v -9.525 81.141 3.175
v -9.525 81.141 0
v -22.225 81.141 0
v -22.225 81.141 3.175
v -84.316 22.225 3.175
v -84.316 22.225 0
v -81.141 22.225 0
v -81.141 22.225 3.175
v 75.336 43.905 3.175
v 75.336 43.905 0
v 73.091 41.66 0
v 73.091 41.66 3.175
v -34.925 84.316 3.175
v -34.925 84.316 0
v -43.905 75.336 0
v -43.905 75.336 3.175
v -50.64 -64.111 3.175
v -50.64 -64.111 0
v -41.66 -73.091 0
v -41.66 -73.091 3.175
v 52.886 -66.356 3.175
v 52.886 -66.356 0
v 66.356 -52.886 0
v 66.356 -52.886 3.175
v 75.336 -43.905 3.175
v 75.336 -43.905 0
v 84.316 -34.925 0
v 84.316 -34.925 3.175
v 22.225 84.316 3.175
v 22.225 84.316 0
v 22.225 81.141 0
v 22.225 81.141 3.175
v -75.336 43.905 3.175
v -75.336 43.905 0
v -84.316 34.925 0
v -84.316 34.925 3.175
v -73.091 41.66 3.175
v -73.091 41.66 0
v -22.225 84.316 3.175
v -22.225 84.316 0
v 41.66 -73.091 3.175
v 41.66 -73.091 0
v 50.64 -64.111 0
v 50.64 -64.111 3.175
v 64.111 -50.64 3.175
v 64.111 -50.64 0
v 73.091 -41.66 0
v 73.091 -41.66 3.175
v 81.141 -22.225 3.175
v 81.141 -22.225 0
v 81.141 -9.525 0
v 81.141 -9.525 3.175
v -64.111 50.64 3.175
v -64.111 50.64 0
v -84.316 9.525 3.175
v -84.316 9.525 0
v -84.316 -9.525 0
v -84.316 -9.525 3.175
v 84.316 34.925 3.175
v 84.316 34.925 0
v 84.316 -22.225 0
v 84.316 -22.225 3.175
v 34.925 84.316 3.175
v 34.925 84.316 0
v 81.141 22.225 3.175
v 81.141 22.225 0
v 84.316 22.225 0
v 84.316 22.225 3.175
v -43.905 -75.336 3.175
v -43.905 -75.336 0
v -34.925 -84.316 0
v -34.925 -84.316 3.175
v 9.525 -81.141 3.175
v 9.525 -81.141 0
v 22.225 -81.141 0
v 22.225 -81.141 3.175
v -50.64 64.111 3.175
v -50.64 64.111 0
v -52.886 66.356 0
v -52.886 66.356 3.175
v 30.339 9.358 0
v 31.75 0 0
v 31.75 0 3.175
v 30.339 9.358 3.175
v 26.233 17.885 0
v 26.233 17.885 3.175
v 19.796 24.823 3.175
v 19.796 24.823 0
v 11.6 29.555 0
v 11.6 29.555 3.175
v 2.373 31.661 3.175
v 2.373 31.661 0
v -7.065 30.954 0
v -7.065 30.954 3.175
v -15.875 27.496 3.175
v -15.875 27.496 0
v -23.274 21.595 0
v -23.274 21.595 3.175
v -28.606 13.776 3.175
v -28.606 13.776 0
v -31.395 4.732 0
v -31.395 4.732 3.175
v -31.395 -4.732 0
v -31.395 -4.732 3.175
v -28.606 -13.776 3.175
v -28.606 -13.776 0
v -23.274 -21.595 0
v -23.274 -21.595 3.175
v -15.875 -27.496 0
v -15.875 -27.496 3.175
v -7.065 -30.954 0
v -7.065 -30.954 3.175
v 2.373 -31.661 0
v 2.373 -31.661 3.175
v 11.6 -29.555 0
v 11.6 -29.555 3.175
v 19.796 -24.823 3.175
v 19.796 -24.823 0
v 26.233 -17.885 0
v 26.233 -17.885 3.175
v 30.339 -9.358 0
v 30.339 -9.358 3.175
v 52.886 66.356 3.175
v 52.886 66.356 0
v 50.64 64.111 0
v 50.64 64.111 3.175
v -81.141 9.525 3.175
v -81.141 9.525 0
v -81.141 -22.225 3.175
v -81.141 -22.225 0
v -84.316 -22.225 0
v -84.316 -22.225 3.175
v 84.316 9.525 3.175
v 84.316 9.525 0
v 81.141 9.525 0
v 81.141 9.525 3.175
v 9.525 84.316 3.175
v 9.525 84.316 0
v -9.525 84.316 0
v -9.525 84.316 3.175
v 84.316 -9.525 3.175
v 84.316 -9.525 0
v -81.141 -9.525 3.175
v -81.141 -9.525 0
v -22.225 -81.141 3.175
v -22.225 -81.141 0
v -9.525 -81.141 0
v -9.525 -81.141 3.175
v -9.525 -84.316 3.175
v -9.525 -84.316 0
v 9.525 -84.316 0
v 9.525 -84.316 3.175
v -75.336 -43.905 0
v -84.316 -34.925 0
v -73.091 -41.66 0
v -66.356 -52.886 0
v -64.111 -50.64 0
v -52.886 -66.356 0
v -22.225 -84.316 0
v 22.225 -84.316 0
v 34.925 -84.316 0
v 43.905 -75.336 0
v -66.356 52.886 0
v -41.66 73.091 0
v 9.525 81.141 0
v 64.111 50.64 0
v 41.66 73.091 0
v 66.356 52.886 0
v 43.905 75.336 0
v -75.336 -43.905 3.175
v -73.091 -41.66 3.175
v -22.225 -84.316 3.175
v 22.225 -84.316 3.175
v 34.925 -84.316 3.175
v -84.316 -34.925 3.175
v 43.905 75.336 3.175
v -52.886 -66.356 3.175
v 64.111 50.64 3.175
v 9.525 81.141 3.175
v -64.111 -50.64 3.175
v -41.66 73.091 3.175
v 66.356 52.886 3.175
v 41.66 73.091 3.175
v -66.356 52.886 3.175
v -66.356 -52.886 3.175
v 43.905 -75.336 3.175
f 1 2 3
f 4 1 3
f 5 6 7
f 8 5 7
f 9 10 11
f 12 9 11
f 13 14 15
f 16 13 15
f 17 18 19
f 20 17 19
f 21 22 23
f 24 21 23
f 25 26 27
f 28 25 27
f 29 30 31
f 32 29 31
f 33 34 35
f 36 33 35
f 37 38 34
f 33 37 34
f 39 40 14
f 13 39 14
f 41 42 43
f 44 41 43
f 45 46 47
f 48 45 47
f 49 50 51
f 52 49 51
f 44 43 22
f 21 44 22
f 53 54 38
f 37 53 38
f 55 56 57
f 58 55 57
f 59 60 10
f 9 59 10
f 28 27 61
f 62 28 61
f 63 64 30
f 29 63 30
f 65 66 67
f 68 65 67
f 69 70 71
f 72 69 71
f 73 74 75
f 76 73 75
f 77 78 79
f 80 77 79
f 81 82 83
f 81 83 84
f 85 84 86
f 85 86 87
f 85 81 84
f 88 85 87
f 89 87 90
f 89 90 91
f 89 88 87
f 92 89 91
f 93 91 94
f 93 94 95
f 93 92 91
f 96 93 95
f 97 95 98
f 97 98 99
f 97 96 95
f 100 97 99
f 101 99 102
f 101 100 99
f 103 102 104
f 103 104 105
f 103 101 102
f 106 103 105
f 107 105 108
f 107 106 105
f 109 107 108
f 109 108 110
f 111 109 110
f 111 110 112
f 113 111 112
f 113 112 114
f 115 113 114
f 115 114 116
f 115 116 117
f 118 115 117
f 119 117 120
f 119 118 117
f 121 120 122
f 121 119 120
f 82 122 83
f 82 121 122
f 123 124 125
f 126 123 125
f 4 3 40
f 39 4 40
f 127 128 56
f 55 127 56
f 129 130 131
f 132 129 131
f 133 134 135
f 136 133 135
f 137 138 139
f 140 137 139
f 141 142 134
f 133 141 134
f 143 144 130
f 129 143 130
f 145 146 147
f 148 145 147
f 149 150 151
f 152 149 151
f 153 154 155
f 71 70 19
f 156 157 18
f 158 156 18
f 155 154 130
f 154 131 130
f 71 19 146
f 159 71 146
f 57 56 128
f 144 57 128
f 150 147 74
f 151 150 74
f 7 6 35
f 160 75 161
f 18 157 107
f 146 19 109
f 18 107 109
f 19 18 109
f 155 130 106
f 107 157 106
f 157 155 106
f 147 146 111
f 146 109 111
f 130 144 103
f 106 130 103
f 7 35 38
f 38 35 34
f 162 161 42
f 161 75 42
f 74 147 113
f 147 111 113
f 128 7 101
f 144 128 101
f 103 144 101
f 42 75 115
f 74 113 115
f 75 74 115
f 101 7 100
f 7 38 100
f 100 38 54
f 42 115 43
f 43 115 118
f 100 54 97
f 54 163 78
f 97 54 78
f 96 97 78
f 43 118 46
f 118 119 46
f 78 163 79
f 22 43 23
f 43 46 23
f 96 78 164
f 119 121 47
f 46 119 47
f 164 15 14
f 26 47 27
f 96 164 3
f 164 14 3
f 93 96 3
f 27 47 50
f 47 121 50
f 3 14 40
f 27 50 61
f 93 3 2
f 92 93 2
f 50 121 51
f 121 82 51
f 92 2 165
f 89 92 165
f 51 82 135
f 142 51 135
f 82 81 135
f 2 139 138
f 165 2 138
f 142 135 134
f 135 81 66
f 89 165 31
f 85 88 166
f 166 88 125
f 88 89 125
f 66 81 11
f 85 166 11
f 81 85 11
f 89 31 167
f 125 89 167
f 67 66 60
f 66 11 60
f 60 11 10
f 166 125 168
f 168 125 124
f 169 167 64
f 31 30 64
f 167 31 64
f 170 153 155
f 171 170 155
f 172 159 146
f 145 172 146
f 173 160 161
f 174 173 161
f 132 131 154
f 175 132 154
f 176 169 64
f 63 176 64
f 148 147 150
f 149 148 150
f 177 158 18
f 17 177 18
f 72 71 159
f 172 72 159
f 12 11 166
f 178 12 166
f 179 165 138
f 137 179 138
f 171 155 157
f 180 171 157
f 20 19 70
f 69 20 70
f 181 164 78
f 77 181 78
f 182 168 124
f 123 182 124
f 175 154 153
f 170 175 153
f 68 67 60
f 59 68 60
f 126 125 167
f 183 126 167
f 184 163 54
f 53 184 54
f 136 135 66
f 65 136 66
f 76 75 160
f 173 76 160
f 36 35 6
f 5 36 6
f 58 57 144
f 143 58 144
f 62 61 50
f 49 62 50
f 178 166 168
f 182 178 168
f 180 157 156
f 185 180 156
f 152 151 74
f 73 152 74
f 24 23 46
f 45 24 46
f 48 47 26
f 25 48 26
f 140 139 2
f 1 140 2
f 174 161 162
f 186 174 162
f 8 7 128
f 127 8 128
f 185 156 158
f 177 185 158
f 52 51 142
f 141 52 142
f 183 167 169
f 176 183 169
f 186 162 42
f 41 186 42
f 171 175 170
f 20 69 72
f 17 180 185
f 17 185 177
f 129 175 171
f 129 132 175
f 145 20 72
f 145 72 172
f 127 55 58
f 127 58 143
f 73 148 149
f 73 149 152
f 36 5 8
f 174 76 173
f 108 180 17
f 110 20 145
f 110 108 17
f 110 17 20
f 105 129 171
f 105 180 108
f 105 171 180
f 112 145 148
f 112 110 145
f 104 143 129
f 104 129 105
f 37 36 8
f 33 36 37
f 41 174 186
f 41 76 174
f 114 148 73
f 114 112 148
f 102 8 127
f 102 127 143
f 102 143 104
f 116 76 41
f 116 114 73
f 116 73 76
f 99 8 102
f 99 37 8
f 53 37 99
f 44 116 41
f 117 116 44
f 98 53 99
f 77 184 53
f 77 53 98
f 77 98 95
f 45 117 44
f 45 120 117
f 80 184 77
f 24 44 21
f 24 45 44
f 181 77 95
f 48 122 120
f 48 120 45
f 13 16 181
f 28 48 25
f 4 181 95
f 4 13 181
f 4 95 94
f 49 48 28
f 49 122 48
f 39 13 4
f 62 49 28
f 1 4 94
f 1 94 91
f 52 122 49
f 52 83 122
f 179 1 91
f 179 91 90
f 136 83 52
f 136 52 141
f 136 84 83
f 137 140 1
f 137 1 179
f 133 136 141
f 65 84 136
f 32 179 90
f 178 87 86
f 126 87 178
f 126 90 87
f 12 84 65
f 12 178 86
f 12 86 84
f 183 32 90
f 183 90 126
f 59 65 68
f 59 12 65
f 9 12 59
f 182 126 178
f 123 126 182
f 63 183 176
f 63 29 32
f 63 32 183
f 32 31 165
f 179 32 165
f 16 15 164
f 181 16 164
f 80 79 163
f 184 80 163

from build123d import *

# Parameters (mm, degrees)
SKETCH1_R           = 31.75
BOSS_EXTRUDE1_DEPTH = 3.175


with BuildPart() as part:
    # Sketch1 → Boss-Extrude1 (new body)
    with BuildSketch(Plane.XY):
        Polygon((41.660192091, 73.091088515), (43.905256121, 75.336152545), (34.925, 84.316408666), (22.225, 84.316408666), (22.225, 81.141408666), (9.525, 81.141408666), (9.525, 84.316408666), (-9.525, 84.316408666), (-9.525, 81.141408666), (-22.225, 81.141408666), (-22.225, 84.316408666), (-34.925, 84.316408666), (-43.905256121, 75.336152545), (-41.660192091, 73.091088515), (-50.640448212, 64.110832393), (-52.885512242, 66.355896424), (-66.355896424, 52.885512242), (-64.110832393, 50.640448212), (-73.091088515, 41.660192091), (-75.336152545, 43.905256121), (-84.316408666, 34.925), (-84.316408666, 22.225), (-81.141408666, 22.225), (-81.141408666, 9.525), (-84.316408666, 9.525), (-84.316408666, -9.525), (-81.141408666, -9.525), (-81.141408666, -22.225), (-84.316408666, -22.225), (-84.316408666, -34.925), (-75.336152545, -43.905256121), (-73.091088515, -41.660192091), (-64.110832393, -50.640448212), (-66.355896424, -52.885512242), (-52.885512242, -66.355896424), (-50.640448212, -64.110832393), (-41.660192091, -73.091088515), (-43.905256121, -75.336152545), (-34.925, -84.316408666), (-22.225, -84.316408666), (-22.225, -81.141408666), (-9.525, -81.141408666), (-9.525, -84.316408666), (9.525, -84.316408666), (9.525, -81.141408666), (22.225, -81.141408666), (22.225, -84.316408666), (34.925, -84.316408666), (43.905256121, -75.336152545), (41.660192091, -73.091088515), (50.640448212, -64.110832393), (52.885512242, -66.355896424), (66.355896424, -52.885512242), (64.110832393, -50.640448212), (73.091088515, -41.660192091), (75.336152545, -43.905256121), (84.316408666, -34.925), (84.316408666, -22.225), (81.141408666, -22.225), (81.141408666, -9.525), (84.316408666, -9.525), (84.316408666, 9.525), (81.141408666, 9.525), (81.141408666, 22.225), (84.316408666, 22.225), (84.316408666, 34.925), (75.336152545, 43.905256121), (73.091088515, 41.660192091), (64.110832393, 50.640448212), (66.355896424, 52.885512242), (52.885512242, 66.355896424), (50.640448212, 64.110832393), align=None)
        Circle(SKETCH1_R, mode=Mode.SUBTRACT)
    extrude(amount=BOSS_EXTRUDE1_DEPTH)


solid = part.part
